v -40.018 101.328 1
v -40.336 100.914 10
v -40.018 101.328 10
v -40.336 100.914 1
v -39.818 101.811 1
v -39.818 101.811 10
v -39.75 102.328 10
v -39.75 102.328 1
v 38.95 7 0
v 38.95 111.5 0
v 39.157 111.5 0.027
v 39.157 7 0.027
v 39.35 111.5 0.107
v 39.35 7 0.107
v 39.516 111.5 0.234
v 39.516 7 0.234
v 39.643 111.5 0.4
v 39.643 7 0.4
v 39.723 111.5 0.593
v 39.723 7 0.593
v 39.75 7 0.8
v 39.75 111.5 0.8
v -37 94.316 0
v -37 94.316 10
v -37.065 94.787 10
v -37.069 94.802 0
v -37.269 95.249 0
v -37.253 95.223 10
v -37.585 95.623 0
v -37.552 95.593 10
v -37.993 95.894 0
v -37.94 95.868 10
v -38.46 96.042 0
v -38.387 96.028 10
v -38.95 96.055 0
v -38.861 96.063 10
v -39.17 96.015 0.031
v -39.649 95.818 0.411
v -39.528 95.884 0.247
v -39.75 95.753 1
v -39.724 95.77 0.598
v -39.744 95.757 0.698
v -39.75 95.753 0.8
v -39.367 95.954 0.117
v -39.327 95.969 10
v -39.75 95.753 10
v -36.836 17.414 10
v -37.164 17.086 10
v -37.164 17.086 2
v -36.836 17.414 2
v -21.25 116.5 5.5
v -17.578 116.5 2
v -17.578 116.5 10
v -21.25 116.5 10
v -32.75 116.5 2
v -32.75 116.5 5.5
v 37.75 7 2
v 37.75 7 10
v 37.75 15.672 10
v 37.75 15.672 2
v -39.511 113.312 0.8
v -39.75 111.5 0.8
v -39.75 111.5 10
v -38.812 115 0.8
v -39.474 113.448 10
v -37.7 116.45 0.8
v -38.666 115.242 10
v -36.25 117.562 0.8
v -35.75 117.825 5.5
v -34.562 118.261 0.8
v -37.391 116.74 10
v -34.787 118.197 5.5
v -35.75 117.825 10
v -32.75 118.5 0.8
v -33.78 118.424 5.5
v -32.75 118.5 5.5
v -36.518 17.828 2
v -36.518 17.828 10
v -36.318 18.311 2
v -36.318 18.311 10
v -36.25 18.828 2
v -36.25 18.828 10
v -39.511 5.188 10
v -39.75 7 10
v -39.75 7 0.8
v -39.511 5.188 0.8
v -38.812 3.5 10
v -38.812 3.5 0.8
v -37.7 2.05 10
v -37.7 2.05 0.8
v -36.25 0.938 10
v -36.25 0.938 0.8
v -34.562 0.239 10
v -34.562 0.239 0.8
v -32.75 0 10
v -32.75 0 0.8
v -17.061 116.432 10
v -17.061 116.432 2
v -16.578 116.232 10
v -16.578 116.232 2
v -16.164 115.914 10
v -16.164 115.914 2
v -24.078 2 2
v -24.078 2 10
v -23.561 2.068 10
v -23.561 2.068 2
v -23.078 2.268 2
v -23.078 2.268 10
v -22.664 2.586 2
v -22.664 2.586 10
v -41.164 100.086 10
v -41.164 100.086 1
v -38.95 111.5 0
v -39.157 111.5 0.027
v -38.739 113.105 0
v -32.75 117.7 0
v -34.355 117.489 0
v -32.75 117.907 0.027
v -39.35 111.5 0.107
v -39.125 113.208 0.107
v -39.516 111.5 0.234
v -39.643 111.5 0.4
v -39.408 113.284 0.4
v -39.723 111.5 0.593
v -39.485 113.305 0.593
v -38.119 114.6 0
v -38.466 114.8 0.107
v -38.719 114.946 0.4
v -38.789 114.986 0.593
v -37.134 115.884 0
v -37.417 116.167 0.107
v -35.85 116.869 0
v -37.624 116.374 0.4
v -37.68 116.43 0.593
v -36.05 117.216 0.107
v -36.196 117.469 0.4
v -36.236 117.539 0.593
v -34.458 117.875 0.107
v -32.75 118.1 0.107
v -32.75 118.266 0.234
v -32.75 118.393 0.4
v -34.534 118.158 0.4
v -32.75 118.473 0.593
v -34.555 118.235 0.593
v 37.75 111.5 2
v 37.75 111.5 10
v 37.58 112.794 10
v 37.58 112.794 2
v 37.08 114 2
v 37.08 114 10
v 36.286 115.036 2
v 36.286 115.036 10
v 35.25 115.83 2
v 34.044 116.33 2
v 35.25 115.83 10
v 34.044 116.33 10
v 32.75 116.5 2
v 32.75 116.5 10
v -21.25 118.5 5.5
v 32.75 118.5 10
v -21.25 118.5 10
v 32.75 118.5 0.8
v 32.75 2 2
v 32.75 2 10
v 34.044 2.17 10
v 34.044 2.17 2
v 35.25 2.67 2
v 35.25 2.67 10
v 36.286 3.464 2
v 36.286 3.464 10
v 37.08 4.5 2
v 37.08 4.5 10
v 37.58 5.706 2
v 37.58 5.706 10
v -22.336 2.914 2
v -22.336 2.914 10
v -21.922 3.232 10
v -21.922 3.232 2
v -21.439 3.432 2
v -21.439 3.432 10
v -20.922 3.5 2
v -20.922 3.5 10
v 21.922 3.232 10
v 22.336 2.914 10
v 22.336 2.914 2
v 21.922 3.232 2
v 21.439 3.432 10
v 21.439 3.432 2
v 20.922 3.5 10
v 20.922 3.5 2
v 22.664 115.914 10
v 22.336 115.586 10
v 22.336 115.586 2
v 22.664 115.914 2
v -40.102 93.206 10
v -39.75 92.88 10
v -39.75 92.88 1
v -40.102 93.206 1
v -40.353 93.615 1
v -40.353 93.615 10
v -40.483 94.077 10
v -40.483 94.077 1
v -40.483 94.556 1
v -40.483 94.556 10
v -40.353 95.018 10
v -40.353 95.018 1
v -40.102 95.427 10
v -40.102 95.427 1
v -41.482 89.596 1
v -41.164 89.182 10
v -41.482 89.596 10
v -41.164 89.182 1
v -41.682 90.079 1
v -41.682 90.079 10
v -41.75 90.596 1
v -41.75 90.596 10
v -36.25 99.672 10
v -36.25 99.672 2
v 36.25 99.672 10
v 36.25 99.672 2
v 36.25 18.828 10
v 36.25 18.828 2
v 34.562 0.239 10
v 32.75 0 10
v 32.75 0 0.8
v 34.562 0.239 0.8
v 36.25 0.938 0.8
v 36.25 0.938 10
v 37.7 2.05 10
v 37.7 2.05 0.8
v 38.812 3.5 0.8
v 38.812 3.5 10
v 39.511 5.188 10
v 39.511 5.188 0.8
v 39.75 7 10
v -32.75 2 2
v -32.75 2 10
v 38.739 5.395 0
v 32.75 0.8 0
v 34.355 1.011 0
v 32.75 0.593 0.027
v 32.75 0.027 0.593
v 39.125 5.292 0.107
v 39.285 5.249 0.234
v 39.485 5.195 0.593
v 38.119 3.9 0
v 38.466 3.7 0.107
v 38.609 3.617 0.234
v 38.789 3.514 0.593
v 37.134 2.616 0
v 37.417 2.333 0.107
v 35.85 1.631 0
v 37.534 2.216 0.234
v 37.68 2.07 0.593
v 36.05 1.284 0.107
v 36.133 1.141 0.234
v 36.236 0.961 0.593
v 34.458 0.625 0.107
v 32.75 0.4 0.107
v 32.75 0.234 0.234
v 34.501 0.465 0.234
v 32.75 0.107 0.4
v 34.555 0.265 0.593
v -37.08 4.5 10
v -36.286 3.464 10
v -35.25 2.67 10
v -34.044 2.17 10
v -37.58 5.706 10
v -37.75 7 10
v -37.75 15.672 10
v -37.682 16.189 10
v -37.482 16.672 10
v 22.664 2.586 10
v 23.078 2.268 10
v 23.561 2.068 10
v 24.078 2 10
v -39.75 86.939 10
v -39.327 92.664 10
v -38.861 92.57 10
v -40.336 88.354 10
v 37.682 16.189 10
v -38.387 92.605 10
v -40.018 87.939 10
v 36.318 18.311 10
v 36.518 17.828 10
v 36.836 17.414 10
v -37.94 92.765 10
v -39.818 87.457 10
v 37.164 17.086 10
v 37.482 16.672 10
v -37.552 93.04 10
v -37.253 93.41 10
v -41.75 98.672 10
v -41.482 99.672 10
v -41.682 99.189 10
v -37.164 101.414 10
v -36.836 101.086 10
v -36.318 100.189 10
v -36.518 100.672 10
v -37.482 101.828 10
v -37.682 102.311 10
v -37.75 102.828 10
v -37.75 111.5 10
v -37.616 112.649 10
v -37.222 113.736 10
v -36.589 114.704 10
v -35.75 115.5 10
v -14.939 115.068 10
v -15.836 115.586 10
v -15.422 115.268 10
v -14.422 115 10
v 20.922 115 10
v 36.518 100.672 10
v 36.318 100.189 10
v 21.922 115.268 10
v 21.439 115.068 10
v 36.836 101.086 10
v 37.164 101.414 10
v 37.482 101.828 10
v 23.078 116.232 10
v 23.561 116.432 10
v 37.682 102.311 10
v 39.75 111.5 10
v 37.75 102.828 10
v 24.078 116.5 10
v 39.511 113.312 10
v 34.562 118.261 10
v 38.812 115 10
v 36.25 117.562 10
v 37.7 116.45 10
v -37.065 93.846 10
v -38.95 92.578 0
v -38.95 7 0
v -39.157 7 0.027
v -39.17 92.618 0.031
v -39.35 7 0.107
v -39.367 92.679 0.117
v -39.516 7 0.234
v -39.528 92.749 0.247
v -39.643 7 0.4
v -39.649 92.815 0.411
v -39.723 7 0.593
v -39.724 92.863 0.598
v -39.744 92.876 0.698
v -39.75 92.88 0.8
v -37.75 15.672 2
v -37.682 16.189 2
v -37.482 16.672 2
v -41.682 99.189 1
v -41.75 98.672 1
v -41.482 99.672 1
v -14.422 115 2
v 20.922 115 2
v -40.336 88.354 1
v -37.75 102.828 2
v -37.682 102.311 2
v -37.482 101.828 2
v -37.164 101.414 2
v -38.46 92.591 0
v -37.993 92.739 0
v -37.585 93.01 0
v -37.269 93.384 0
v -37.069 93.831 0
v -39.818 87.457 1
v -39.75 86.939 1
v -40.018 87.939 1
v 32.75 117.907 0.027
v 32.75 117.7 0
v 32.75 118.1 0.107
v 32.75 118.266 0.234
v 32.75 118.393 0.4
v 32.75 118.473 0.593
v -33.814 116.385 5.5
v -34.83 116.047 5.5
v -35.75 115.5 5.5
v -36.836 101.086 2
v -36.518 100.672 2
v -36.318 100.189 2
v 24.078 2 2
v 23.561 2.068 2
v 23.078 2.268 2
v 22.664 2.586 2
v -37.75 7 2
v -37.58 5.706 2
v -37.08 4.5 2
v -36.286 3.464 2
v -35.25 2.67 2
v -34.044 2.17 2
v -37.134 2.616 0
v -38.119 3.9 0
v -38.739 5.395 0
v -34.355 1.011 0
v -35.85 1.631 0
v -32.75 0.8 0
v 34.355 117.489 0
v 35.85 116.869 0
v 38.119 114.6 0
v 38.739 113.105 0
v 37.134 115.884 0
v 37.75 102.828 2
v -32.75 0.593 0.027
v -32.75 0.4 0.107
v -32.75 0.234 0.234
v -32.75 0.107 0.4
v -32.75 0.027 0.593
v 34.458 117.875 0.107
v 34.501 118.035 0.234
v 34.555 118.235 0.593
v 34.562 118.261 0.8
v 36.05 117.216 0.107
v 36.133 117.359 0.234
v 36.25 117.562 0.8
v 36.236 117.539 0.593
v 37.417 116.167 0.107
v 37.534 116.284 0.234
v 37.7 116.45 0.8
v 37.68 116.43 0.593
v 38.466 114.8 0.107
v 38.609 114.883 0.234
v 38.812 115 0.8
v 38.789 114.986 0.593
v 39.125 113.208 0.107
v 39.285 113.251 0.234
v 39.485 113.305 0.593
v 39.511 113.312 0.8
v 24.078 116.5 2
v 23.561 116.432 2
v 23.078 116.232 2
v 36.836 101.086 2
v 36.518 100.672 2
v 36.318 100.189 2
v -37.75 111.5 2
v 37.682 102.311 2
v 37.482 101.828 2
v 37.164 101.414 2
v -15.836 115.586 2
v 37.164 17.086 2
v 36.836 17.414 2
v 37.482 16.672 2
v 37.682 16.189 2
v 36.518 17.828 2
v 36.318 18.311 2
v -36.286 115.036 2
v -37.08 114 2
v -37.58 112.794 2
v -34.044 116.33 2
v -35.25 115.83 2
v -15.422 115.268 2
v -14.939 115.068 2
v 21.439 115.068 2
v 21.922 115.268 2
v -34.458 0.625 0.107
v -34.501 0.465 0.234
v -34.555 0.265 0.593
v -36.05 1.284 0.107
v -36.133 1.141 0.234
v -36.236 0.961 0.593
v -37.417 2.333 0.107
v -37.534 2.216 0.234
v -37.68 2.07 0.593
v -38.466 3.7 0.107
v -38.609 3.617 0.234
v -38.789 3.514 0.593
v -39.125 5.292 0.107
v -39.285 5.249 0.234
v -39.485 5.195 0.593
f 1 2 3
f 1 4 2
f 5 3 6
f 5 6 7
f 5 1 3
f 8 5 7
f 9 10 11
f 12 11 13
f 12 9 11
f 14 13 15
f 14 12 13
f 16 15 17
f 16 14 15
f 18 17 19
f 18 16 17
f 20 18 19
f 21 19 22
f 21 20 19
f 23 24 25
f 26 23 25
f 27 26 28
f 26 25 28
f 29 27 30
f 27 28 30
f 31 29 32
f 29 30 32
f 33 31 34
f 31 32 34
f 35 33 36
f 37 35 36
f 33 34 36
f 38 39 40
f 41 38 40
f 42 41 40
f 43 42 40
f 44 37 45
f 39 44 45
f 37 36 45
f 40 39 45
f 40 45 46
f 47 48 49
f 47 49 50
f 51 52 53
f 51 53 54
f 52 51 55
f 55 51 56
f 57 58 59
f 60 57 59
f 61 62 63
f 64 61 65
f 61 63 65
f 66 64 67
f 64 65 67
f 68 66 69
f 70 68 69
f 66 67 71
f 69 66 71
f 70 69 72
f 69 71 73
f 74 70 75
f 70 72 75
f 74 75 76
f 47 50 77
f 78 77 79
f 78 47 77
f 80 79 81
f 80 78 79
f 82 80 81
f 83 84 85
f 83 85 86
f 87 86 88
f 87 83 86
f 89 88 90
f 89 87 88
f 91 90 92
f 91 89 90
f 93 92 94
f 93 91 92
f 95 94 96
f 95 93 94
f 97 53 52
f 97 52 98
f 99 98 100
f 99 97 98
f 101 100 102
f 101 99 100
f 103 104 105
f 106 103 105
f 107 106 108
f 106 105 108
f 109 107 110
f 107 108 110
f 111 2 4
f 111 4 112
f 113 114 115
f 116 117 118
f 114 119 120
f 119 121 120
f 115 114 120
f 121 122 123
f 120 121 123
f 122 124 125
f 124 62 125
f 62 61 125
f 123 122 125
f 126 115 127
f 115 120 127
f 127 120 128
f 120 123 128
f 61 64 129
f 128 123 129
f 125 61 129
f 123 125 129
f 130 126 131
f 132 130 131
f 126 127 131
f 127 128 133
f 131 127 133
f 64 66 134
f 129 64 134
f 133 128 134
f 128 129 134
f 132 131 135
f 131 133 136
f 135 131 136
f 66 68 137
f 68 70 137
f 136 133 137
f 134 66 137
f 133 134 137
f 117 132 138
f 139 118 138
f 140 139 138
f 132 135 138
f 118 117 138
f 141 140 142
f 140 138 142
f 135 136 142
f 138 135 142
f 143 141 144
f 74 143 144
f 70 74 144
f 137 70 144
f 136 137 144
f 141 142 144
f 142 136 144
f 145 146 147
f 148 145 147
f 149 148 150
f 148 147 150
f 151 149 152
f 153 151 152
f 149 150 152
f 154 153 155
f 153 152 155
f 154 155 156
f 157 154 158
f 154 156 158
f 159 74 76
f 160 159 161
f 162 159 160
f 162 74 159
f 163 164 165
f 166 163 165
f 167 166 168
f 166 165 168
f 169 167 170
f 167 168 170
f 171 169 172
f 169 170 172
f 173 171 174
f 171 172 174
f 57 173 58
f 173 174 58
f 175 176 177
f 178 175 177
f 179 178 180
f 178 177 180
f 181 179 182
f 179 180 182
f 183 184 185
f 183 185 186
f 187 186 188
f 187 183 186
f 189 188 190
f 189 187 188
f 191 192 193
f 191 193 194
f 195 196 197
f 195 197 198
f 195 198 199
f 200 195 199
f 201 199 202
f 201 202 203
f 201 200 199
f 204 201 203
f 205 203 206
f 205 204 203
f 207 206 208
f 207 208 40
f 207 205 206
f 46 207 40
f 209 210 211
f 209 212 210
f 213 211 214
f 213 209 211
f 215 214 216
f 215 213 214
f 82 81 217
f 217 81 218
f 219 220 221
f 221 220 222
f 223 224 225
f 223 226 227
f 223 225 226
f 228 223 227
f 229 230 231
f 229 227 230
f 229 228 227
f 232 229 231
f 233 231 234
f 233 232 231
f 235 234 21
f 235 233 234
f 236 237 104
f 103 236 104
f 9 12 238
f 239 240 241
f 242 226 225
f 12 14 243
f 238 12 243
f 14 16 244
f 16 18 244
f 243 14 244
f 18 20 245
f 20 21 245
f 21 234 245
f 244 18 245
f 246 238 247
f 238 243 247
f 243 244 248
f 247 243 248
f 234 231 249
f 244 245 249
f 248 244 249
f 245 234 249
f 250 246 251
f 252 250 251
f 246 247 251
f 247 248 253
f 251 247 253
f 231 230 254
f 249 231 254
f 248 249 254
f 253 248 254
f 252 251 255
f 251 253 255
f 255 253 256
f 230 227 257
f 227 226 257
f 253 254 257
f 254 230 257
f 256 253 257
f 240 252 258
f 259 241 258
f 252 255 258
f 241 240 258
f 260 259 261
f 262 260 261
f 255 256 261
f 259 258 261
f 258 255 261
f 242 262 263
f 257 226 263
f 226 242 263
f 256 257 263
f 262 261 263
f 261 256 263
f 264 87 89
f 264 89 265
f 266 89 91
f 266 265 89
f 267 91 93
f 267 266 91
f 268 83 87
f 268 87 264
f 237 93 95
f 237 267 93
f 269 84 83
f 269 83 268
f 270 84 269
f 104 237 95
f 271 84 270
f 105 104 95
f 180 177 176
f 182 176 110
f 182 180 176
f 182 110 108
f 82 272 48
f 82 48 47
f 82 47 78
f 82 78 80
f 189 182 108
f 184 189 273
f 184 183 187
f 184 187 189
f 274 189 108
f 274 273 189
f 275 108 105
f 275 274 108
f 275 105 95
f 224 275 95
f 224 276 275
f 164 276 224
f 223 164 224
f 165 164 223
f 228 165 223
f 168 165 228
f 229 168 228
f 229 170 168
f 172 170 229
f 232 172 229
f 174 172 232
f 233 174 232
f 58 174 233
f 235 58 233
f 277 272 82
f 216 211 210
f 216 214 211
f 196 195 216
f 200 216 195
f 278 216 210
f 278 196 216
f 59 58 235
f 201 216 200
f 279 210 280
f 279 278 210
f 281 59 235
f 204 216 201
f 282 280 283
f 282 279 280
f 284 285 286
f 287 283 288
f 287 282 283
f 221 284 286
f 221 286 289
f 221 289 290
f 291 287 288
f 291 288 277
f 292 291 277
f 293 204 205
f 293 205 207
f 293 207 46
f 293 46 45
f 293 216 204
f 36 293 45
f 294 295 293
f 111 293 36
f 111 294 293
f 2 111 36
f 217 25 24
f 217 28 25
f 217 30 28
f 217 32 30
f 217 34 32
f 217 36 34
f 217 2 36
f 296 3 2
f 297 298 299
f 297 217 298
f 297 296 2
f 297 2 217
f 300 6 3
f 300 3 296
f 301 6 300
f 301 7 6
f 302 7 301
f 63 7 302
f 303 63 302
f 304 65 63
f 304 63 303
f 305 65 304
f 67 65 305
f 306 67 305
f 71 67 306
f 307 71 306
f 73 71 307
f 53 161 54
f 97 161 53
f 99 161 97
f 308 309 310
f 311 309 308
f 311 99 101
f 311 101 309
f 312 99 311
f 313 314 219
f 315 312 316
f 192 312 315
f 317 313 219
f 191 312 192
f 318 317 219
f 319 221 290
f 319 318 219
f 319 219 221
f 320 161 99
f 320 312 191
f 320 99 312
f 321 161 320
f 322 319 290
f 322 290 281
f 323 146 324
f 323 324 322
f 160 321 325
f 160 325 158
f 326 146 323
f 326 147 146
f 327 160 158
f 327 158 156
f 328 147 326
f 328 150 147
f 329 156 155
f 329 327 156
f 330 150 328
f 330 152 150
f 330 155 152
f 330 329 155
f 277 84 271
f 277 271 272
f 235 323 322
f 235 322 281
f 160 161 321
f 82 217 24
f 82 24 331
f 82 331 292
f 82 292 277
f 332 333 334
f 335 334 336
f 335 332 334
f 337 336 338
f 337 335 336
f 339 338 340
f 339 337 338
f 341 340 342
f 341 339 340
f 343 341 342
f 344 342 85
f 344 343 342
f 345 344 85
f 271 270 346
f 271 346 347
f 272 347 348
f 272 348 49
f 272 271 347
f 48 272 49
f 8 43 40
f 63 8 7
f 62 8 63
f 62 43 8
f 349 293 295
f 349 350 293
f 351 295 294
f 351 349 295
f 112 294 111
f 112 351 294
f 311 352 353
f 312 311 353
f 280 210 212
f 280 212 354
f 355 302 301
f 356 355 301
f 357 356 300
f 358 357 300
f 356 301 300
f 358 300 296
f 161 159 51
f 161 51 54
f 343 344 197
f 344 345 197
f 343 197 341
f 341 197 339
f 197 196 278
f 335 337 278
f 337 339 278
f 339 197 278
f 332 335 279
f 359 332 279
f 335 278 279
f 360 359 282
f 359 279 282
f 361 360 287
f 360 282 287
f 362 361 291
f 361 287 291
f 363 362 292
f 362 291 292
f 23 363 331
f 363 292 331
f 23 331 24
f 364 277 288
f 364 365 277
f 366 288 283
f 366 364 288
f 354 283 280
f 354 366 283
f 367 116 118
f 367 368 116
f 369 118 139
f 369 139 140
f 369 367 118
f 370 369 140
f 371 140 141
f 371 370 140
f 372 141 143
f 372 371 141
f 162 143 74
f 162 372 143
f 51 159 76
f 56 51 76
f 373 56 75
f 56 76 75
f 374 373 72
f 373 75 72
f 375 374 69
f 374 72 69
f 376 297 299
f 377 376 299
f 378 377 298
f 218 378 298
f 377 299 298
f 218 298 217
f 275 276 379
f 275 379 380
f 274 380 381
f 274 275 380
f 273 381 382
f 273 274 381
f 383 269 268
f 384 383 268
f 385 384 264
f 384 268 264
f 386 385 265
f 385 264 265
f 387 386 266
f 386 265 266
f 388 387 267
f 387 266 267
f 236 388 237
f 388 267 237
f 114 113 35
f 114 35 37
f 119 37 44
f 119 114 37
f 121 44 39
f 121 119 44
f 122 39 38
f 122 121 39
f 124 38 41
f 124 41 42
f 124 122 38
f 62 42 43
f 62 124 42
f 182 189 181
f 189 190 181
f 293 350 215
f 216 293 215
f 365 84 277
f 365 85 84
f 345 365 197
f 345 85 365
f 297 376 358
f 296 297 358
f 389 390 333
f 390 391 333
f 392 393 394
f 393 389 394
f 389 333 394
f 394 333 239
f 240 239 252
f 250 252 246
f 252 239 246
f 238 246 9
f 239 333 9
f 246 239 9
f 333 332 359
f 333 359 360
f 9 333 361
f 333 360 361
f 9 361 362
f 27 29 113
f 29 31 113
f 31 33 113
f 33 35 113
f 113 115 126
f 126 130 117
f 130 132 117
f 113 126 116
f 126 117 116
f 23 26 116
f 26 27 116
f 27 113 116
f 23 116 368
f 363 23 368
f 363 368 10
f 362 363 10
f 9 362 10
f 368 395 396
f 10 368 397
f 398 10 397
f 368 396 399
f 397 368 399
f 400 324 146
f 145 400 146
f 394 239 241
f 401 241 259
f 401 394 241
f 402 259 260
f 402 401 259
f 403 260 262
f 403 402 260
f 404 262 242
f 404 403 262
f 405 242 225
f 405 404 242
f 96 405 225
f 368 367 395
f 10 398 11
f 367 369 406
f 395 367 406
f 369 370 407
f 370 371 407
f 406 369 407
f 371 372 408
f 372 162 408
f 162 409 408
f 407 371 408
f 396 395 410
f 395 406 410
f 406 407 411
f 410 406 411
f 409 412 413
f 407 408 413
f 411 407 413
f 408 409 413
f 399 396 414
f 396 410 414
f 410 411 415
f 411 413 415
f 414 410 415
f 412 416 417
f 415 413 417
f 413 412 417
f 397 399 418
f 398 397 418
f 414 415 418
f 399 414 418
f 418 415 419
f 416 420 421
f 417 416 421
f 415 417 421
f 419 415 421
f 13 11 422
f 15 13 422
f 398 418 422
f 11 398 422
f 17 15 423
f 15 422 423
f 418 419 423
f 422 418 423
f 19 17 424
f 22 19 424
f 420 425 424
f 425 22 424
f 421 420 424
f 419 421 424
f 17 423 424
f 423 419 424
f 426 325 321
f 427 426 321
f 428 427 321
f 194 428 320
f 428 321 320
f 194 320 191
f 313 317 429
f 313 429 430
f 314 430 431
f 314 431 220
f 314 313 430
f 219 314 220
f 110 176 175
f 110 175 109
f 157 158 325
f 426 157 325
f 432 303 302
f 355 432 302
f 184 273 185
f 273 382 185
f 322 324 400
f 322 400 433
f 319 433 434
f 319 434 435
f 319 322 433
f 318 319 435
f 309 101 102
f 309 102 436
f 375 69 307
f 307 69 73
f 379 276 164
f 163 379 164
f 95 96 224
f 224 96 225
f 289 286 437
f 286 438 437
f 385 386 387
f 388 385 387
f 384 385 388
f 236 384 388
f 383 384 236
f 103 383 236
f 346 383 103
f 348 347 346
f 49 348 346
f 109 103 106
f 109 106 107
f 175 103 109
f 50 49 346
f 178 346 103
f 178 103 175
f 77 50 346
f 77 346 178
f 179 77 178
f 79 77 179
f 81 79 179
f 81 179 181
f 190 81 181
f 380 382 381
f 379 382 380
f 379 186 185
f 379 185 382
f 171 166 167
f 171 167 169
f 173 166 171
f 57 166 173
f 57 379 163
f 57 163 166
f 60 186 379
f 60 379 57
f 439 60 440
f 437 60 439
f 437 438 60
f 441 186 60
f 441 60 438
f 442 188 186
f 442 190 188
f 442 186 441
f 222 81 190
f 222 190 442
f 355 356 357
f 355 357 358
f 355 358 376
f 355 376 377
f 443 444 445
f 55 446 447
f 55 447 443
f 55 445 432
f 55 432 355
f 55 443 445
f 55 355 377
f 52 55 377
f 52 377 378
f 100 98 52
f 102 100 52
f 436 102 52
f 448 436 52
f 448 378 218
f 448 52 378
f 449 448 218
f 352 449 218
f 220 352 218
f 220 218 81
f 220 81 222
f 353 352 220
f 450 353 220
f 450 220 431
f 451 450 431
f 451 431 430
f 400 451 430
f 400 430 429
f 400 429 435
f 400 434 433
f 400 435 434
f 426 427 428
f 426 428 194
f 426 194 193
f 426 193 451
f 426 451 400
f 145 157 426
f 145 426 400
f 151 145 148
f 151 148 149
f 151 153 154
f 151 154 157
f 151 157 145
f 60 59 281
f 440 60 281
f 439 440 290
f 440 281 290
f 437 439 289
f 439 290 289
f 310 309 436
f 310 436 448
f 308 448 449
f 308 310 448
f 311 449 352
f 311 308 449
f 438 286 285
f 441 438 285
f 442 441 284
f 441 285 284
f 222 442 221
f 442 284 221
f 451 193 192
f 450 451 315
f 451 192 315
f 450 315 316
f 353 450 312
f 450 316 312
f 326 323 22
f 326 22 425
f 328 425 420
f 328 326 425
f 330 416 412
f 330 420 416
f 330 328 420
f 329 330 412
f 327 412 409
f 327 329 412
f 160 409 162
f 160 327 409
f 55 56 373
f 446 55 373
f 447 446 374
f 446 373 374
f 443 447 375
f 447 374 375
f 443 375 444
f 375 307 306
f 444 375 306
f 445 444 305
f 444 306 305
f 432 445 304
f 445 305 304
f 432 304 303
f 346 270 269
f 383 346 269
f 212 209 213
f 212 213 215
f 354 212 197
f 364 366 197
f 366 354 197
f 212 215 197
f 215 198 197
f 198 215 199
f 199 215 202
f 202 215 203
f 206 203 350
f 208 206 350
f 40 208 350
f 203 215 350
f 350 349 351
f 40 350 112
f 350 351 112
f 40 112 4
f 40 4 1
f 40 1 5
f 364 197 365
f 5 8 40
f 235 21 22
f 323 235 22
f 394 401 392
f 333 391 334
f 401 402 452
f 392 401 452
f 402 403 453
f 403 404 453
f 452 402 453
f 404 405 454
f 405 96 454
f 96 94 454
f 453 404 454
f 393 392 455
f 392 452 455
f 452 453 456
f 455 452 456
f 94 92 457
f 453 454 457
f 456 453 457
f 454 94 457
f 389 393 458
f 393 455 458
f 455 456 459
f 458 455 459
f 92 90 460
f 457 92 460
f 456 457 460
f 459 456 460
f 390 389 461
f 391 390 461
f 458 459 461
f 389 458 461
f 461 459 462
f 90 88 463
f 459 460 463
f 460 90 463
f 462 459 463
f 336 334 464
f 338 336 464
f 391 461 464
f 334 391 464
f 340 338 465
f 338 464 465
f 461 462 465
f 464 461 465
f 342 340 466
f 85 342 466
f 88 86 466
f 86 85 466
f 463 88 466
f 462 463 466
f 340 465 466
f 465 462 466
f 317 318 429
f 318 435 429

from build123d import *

# Parameters (mm, degrees)
F0_W      = 79.5
F0_H      = 118.5
F1_DEPTH  = 10
F3_R      = 7
F5_DEPTH  = 3.5
F6_R      = 0.8
F8_DEPTH  = 3.5
F9_R      = 2
F10_DEPTH = 4.5
F2_W      = 14.5
F2_H      = 4.5
F11_DEPTH = 4
F13_DEPTH = 9
F14_DEPTH = 25
F15_R     = 2


with BuildPart() as f1:
    # F0 (on Top) → F1 (new body)
    with BuildSketch(Plane.XY):
        with Locations((0, 59.25)):
            Rectangle(F0_W, F0_H)
    extrude(amount=F1_DEPTH)

    # F3
    f3_edges = [f1.edges().sort_by_distance(p)[0] for p in [
        (-39.75, 118.5, 5),
        (-39.75, 0, 5),
        (39.75, 0, 5),
        (39.75, 118.5, 5),
    ]]
    fillet(f3_edges, radius=F3_R)

    # F4 (on face) → F5 (cut)
    with BuildSketch(Plane.XY.offset(10)):
        with BuildLine():
            Line((32.75, 116.5), (-32.75, 116.5))
            ThreePointArc((-32.75, 116.5), (-36.2855339059, 115.0355339059), (-37.75, 111.5))
            Line((-37.75, 111.5), (-37.75, 7))
            ThreePointArc((-37.75, 7), (-36.2855339059, 3.4644660941), (-32.75, 2))
            Line((-32.75, 2), (32.75, 2))
            ThreePointArc((32.75, 2), (36.2855339059, 3.4644660941), (37.75, 7))
            Line((37.75, 7), (37.75, 111.5))
            ThreePointArc((37.75, 111.5), (36.2855339059, 115.0355339059), (32.75, 116.5))
        make_face()
    extrude(amount=-F5_DEPTH, mode=Mode.SUBTRACT)

    # F6
    f6_edges = [f1.edges().sort_by_distance(p)[0] for p in [
        (0, 118.5, 0),
        (37.699747, 116.449747, 0),
        (-37.699747, 116.449747, 0),
        (39.75, 59.25, 0),
        (-39.75, 59.25, 0),
        (37.699747, 2.050253, 0),
        (-37.699747, 2.050253, 0),
        (0, 0, 0),
    ]]
    fillet(f6_edges, radius=F6_R)

    # F7 (on face) → F8 (join)
    with BuildSketch(Plane.XY.offset(6.5)):
        Polygon((-36.25, 100.5), (-37.75, 102), (-37.75, 16.5), (-36.25, 18), align=None)
        Polygon((37.75, 16.5), (37.75, 102), (36.25, 100.5), (36.25, 18), align=None)
        Polygon((-21.75, 3.5), (-23.25, 2), (23.25, 2), (21.75, 3.5), align=None)
        Polygon((23.25, 116.5), (-16.75, 116.5), (-15.25, 115), (21.75, 115), align=None)
    extrude(amount=F8_DEPTH)

    # F9
    f9_edges = [f1.edges().sort_by_distance(p)[0] for p in [
        (-37.75, 102, 8.25),
        (-36.25, 100.5, 8.25),
        (-37.75, 16.5, 8.25),
        (-36.25, 18, 8.25),
        (36.25, 100.5, 8.25),
        (37.75, 102, 8.25),
        (36.25, 18, 8.25),
        (37.75, 16.5, 8.25),
        (23.25, 2, 8.25),
        (21.75, 3.5, 8.25),
        (-23.25, 2, 8.25),
        (-21.75, 3.5, 8.25),
        (-16.75, 116.5, 8.25),
        (-15.25, 115, 8.25),
        (21.75, 115, 8.25),
        (23.25, 116.5, 8.25),
    ]]
    fillet(f9_edges, radius=F9_R)

    # F10 (cut): a face of the model
    f10_faces = [f1.faces().sort_by_distance(p)[0] for p in [
        (-0.0227609258, 59.3168047951, 6.5),
    ]]
    extrude(f10_faces, amount=-F10_DEPTH, mode=Mode.SUBTRACT)

    # F2 (on face) → F11 (cut)
    with BuildSketch(Plane(origin=(0, 118.5, 0), x_dir=(-1, 0, 0), z_dir=(0, 1, 0))):
        with Locations((28.5, 7.75)):
            Rectangle(F2_W, F2_H)
    extrude(amount=-F11_DEPTH, mode=Mode.SUBTRACT)

    # F12 (on face) → F13 (join)
    with BuildSketch(Plane.XY.offset(10)):
        with BuildLine():
            ThreePointArc((-39.75, 92.8803269811), (-40.5, 94.3164676428), (-39.75, 95.7526083044))
            Line((-39.75, 95.7526083044), (-39.75, 101.5))
            Line((-39.75, 101.5), (-41.75, 99.5))
            Line((-41.75, 99.5), (-41.75, 89.7678693718))
            Line((-41.75, 89.7678693718), (-39.75, 87.7678693718))
            Line((-39.75, 87.7678693718), (-39.75, 92.8803269811))
        make_face()
    extrude(amount=-F13_DEPTH)

    # F12 (on face) → F14 (cut)
    with BuildSketch(Plane.XY.offset(10)):
        with BuildLine():
            Line((-39.75, 92.8803269811), (-39.75, 95.7526083044))
            ThreePointArc((-39.75, 95.7526083044), (-40.5, 94.3164676428), (-39.75, 92.8803269811))
        make_face()
        with BuildLine():
            ThreePointArc((-39.75, 92.8803269811), (-37.9399074127, 92.765258437), (-37, 94.3164676428))
            ThreePointArc((-37, 94.3164676428), (-37.9399074127, 95.8676768485), (-39.75, 95.7526083044))
            Line((-39.75, 95.7526083044), (-39.75, 92.8803269811))
        make_face()
    extrude(amount=-F14_DEPTH, mode=Mode.SUBTRACT)

    # F15
    f15_edges = [f1.edges().sort_by_distance(p)[0] for p in [
        (-41.75, 99.5, 5.5),
        (-39.75, 101.5, 5.5),
        (-41.75, 89.767869, 5.5),
        (-39.75, 87.767869, 5.5),
    ]]
    fillet(f15_edges, radius=F15_R)


solid = f1.part
